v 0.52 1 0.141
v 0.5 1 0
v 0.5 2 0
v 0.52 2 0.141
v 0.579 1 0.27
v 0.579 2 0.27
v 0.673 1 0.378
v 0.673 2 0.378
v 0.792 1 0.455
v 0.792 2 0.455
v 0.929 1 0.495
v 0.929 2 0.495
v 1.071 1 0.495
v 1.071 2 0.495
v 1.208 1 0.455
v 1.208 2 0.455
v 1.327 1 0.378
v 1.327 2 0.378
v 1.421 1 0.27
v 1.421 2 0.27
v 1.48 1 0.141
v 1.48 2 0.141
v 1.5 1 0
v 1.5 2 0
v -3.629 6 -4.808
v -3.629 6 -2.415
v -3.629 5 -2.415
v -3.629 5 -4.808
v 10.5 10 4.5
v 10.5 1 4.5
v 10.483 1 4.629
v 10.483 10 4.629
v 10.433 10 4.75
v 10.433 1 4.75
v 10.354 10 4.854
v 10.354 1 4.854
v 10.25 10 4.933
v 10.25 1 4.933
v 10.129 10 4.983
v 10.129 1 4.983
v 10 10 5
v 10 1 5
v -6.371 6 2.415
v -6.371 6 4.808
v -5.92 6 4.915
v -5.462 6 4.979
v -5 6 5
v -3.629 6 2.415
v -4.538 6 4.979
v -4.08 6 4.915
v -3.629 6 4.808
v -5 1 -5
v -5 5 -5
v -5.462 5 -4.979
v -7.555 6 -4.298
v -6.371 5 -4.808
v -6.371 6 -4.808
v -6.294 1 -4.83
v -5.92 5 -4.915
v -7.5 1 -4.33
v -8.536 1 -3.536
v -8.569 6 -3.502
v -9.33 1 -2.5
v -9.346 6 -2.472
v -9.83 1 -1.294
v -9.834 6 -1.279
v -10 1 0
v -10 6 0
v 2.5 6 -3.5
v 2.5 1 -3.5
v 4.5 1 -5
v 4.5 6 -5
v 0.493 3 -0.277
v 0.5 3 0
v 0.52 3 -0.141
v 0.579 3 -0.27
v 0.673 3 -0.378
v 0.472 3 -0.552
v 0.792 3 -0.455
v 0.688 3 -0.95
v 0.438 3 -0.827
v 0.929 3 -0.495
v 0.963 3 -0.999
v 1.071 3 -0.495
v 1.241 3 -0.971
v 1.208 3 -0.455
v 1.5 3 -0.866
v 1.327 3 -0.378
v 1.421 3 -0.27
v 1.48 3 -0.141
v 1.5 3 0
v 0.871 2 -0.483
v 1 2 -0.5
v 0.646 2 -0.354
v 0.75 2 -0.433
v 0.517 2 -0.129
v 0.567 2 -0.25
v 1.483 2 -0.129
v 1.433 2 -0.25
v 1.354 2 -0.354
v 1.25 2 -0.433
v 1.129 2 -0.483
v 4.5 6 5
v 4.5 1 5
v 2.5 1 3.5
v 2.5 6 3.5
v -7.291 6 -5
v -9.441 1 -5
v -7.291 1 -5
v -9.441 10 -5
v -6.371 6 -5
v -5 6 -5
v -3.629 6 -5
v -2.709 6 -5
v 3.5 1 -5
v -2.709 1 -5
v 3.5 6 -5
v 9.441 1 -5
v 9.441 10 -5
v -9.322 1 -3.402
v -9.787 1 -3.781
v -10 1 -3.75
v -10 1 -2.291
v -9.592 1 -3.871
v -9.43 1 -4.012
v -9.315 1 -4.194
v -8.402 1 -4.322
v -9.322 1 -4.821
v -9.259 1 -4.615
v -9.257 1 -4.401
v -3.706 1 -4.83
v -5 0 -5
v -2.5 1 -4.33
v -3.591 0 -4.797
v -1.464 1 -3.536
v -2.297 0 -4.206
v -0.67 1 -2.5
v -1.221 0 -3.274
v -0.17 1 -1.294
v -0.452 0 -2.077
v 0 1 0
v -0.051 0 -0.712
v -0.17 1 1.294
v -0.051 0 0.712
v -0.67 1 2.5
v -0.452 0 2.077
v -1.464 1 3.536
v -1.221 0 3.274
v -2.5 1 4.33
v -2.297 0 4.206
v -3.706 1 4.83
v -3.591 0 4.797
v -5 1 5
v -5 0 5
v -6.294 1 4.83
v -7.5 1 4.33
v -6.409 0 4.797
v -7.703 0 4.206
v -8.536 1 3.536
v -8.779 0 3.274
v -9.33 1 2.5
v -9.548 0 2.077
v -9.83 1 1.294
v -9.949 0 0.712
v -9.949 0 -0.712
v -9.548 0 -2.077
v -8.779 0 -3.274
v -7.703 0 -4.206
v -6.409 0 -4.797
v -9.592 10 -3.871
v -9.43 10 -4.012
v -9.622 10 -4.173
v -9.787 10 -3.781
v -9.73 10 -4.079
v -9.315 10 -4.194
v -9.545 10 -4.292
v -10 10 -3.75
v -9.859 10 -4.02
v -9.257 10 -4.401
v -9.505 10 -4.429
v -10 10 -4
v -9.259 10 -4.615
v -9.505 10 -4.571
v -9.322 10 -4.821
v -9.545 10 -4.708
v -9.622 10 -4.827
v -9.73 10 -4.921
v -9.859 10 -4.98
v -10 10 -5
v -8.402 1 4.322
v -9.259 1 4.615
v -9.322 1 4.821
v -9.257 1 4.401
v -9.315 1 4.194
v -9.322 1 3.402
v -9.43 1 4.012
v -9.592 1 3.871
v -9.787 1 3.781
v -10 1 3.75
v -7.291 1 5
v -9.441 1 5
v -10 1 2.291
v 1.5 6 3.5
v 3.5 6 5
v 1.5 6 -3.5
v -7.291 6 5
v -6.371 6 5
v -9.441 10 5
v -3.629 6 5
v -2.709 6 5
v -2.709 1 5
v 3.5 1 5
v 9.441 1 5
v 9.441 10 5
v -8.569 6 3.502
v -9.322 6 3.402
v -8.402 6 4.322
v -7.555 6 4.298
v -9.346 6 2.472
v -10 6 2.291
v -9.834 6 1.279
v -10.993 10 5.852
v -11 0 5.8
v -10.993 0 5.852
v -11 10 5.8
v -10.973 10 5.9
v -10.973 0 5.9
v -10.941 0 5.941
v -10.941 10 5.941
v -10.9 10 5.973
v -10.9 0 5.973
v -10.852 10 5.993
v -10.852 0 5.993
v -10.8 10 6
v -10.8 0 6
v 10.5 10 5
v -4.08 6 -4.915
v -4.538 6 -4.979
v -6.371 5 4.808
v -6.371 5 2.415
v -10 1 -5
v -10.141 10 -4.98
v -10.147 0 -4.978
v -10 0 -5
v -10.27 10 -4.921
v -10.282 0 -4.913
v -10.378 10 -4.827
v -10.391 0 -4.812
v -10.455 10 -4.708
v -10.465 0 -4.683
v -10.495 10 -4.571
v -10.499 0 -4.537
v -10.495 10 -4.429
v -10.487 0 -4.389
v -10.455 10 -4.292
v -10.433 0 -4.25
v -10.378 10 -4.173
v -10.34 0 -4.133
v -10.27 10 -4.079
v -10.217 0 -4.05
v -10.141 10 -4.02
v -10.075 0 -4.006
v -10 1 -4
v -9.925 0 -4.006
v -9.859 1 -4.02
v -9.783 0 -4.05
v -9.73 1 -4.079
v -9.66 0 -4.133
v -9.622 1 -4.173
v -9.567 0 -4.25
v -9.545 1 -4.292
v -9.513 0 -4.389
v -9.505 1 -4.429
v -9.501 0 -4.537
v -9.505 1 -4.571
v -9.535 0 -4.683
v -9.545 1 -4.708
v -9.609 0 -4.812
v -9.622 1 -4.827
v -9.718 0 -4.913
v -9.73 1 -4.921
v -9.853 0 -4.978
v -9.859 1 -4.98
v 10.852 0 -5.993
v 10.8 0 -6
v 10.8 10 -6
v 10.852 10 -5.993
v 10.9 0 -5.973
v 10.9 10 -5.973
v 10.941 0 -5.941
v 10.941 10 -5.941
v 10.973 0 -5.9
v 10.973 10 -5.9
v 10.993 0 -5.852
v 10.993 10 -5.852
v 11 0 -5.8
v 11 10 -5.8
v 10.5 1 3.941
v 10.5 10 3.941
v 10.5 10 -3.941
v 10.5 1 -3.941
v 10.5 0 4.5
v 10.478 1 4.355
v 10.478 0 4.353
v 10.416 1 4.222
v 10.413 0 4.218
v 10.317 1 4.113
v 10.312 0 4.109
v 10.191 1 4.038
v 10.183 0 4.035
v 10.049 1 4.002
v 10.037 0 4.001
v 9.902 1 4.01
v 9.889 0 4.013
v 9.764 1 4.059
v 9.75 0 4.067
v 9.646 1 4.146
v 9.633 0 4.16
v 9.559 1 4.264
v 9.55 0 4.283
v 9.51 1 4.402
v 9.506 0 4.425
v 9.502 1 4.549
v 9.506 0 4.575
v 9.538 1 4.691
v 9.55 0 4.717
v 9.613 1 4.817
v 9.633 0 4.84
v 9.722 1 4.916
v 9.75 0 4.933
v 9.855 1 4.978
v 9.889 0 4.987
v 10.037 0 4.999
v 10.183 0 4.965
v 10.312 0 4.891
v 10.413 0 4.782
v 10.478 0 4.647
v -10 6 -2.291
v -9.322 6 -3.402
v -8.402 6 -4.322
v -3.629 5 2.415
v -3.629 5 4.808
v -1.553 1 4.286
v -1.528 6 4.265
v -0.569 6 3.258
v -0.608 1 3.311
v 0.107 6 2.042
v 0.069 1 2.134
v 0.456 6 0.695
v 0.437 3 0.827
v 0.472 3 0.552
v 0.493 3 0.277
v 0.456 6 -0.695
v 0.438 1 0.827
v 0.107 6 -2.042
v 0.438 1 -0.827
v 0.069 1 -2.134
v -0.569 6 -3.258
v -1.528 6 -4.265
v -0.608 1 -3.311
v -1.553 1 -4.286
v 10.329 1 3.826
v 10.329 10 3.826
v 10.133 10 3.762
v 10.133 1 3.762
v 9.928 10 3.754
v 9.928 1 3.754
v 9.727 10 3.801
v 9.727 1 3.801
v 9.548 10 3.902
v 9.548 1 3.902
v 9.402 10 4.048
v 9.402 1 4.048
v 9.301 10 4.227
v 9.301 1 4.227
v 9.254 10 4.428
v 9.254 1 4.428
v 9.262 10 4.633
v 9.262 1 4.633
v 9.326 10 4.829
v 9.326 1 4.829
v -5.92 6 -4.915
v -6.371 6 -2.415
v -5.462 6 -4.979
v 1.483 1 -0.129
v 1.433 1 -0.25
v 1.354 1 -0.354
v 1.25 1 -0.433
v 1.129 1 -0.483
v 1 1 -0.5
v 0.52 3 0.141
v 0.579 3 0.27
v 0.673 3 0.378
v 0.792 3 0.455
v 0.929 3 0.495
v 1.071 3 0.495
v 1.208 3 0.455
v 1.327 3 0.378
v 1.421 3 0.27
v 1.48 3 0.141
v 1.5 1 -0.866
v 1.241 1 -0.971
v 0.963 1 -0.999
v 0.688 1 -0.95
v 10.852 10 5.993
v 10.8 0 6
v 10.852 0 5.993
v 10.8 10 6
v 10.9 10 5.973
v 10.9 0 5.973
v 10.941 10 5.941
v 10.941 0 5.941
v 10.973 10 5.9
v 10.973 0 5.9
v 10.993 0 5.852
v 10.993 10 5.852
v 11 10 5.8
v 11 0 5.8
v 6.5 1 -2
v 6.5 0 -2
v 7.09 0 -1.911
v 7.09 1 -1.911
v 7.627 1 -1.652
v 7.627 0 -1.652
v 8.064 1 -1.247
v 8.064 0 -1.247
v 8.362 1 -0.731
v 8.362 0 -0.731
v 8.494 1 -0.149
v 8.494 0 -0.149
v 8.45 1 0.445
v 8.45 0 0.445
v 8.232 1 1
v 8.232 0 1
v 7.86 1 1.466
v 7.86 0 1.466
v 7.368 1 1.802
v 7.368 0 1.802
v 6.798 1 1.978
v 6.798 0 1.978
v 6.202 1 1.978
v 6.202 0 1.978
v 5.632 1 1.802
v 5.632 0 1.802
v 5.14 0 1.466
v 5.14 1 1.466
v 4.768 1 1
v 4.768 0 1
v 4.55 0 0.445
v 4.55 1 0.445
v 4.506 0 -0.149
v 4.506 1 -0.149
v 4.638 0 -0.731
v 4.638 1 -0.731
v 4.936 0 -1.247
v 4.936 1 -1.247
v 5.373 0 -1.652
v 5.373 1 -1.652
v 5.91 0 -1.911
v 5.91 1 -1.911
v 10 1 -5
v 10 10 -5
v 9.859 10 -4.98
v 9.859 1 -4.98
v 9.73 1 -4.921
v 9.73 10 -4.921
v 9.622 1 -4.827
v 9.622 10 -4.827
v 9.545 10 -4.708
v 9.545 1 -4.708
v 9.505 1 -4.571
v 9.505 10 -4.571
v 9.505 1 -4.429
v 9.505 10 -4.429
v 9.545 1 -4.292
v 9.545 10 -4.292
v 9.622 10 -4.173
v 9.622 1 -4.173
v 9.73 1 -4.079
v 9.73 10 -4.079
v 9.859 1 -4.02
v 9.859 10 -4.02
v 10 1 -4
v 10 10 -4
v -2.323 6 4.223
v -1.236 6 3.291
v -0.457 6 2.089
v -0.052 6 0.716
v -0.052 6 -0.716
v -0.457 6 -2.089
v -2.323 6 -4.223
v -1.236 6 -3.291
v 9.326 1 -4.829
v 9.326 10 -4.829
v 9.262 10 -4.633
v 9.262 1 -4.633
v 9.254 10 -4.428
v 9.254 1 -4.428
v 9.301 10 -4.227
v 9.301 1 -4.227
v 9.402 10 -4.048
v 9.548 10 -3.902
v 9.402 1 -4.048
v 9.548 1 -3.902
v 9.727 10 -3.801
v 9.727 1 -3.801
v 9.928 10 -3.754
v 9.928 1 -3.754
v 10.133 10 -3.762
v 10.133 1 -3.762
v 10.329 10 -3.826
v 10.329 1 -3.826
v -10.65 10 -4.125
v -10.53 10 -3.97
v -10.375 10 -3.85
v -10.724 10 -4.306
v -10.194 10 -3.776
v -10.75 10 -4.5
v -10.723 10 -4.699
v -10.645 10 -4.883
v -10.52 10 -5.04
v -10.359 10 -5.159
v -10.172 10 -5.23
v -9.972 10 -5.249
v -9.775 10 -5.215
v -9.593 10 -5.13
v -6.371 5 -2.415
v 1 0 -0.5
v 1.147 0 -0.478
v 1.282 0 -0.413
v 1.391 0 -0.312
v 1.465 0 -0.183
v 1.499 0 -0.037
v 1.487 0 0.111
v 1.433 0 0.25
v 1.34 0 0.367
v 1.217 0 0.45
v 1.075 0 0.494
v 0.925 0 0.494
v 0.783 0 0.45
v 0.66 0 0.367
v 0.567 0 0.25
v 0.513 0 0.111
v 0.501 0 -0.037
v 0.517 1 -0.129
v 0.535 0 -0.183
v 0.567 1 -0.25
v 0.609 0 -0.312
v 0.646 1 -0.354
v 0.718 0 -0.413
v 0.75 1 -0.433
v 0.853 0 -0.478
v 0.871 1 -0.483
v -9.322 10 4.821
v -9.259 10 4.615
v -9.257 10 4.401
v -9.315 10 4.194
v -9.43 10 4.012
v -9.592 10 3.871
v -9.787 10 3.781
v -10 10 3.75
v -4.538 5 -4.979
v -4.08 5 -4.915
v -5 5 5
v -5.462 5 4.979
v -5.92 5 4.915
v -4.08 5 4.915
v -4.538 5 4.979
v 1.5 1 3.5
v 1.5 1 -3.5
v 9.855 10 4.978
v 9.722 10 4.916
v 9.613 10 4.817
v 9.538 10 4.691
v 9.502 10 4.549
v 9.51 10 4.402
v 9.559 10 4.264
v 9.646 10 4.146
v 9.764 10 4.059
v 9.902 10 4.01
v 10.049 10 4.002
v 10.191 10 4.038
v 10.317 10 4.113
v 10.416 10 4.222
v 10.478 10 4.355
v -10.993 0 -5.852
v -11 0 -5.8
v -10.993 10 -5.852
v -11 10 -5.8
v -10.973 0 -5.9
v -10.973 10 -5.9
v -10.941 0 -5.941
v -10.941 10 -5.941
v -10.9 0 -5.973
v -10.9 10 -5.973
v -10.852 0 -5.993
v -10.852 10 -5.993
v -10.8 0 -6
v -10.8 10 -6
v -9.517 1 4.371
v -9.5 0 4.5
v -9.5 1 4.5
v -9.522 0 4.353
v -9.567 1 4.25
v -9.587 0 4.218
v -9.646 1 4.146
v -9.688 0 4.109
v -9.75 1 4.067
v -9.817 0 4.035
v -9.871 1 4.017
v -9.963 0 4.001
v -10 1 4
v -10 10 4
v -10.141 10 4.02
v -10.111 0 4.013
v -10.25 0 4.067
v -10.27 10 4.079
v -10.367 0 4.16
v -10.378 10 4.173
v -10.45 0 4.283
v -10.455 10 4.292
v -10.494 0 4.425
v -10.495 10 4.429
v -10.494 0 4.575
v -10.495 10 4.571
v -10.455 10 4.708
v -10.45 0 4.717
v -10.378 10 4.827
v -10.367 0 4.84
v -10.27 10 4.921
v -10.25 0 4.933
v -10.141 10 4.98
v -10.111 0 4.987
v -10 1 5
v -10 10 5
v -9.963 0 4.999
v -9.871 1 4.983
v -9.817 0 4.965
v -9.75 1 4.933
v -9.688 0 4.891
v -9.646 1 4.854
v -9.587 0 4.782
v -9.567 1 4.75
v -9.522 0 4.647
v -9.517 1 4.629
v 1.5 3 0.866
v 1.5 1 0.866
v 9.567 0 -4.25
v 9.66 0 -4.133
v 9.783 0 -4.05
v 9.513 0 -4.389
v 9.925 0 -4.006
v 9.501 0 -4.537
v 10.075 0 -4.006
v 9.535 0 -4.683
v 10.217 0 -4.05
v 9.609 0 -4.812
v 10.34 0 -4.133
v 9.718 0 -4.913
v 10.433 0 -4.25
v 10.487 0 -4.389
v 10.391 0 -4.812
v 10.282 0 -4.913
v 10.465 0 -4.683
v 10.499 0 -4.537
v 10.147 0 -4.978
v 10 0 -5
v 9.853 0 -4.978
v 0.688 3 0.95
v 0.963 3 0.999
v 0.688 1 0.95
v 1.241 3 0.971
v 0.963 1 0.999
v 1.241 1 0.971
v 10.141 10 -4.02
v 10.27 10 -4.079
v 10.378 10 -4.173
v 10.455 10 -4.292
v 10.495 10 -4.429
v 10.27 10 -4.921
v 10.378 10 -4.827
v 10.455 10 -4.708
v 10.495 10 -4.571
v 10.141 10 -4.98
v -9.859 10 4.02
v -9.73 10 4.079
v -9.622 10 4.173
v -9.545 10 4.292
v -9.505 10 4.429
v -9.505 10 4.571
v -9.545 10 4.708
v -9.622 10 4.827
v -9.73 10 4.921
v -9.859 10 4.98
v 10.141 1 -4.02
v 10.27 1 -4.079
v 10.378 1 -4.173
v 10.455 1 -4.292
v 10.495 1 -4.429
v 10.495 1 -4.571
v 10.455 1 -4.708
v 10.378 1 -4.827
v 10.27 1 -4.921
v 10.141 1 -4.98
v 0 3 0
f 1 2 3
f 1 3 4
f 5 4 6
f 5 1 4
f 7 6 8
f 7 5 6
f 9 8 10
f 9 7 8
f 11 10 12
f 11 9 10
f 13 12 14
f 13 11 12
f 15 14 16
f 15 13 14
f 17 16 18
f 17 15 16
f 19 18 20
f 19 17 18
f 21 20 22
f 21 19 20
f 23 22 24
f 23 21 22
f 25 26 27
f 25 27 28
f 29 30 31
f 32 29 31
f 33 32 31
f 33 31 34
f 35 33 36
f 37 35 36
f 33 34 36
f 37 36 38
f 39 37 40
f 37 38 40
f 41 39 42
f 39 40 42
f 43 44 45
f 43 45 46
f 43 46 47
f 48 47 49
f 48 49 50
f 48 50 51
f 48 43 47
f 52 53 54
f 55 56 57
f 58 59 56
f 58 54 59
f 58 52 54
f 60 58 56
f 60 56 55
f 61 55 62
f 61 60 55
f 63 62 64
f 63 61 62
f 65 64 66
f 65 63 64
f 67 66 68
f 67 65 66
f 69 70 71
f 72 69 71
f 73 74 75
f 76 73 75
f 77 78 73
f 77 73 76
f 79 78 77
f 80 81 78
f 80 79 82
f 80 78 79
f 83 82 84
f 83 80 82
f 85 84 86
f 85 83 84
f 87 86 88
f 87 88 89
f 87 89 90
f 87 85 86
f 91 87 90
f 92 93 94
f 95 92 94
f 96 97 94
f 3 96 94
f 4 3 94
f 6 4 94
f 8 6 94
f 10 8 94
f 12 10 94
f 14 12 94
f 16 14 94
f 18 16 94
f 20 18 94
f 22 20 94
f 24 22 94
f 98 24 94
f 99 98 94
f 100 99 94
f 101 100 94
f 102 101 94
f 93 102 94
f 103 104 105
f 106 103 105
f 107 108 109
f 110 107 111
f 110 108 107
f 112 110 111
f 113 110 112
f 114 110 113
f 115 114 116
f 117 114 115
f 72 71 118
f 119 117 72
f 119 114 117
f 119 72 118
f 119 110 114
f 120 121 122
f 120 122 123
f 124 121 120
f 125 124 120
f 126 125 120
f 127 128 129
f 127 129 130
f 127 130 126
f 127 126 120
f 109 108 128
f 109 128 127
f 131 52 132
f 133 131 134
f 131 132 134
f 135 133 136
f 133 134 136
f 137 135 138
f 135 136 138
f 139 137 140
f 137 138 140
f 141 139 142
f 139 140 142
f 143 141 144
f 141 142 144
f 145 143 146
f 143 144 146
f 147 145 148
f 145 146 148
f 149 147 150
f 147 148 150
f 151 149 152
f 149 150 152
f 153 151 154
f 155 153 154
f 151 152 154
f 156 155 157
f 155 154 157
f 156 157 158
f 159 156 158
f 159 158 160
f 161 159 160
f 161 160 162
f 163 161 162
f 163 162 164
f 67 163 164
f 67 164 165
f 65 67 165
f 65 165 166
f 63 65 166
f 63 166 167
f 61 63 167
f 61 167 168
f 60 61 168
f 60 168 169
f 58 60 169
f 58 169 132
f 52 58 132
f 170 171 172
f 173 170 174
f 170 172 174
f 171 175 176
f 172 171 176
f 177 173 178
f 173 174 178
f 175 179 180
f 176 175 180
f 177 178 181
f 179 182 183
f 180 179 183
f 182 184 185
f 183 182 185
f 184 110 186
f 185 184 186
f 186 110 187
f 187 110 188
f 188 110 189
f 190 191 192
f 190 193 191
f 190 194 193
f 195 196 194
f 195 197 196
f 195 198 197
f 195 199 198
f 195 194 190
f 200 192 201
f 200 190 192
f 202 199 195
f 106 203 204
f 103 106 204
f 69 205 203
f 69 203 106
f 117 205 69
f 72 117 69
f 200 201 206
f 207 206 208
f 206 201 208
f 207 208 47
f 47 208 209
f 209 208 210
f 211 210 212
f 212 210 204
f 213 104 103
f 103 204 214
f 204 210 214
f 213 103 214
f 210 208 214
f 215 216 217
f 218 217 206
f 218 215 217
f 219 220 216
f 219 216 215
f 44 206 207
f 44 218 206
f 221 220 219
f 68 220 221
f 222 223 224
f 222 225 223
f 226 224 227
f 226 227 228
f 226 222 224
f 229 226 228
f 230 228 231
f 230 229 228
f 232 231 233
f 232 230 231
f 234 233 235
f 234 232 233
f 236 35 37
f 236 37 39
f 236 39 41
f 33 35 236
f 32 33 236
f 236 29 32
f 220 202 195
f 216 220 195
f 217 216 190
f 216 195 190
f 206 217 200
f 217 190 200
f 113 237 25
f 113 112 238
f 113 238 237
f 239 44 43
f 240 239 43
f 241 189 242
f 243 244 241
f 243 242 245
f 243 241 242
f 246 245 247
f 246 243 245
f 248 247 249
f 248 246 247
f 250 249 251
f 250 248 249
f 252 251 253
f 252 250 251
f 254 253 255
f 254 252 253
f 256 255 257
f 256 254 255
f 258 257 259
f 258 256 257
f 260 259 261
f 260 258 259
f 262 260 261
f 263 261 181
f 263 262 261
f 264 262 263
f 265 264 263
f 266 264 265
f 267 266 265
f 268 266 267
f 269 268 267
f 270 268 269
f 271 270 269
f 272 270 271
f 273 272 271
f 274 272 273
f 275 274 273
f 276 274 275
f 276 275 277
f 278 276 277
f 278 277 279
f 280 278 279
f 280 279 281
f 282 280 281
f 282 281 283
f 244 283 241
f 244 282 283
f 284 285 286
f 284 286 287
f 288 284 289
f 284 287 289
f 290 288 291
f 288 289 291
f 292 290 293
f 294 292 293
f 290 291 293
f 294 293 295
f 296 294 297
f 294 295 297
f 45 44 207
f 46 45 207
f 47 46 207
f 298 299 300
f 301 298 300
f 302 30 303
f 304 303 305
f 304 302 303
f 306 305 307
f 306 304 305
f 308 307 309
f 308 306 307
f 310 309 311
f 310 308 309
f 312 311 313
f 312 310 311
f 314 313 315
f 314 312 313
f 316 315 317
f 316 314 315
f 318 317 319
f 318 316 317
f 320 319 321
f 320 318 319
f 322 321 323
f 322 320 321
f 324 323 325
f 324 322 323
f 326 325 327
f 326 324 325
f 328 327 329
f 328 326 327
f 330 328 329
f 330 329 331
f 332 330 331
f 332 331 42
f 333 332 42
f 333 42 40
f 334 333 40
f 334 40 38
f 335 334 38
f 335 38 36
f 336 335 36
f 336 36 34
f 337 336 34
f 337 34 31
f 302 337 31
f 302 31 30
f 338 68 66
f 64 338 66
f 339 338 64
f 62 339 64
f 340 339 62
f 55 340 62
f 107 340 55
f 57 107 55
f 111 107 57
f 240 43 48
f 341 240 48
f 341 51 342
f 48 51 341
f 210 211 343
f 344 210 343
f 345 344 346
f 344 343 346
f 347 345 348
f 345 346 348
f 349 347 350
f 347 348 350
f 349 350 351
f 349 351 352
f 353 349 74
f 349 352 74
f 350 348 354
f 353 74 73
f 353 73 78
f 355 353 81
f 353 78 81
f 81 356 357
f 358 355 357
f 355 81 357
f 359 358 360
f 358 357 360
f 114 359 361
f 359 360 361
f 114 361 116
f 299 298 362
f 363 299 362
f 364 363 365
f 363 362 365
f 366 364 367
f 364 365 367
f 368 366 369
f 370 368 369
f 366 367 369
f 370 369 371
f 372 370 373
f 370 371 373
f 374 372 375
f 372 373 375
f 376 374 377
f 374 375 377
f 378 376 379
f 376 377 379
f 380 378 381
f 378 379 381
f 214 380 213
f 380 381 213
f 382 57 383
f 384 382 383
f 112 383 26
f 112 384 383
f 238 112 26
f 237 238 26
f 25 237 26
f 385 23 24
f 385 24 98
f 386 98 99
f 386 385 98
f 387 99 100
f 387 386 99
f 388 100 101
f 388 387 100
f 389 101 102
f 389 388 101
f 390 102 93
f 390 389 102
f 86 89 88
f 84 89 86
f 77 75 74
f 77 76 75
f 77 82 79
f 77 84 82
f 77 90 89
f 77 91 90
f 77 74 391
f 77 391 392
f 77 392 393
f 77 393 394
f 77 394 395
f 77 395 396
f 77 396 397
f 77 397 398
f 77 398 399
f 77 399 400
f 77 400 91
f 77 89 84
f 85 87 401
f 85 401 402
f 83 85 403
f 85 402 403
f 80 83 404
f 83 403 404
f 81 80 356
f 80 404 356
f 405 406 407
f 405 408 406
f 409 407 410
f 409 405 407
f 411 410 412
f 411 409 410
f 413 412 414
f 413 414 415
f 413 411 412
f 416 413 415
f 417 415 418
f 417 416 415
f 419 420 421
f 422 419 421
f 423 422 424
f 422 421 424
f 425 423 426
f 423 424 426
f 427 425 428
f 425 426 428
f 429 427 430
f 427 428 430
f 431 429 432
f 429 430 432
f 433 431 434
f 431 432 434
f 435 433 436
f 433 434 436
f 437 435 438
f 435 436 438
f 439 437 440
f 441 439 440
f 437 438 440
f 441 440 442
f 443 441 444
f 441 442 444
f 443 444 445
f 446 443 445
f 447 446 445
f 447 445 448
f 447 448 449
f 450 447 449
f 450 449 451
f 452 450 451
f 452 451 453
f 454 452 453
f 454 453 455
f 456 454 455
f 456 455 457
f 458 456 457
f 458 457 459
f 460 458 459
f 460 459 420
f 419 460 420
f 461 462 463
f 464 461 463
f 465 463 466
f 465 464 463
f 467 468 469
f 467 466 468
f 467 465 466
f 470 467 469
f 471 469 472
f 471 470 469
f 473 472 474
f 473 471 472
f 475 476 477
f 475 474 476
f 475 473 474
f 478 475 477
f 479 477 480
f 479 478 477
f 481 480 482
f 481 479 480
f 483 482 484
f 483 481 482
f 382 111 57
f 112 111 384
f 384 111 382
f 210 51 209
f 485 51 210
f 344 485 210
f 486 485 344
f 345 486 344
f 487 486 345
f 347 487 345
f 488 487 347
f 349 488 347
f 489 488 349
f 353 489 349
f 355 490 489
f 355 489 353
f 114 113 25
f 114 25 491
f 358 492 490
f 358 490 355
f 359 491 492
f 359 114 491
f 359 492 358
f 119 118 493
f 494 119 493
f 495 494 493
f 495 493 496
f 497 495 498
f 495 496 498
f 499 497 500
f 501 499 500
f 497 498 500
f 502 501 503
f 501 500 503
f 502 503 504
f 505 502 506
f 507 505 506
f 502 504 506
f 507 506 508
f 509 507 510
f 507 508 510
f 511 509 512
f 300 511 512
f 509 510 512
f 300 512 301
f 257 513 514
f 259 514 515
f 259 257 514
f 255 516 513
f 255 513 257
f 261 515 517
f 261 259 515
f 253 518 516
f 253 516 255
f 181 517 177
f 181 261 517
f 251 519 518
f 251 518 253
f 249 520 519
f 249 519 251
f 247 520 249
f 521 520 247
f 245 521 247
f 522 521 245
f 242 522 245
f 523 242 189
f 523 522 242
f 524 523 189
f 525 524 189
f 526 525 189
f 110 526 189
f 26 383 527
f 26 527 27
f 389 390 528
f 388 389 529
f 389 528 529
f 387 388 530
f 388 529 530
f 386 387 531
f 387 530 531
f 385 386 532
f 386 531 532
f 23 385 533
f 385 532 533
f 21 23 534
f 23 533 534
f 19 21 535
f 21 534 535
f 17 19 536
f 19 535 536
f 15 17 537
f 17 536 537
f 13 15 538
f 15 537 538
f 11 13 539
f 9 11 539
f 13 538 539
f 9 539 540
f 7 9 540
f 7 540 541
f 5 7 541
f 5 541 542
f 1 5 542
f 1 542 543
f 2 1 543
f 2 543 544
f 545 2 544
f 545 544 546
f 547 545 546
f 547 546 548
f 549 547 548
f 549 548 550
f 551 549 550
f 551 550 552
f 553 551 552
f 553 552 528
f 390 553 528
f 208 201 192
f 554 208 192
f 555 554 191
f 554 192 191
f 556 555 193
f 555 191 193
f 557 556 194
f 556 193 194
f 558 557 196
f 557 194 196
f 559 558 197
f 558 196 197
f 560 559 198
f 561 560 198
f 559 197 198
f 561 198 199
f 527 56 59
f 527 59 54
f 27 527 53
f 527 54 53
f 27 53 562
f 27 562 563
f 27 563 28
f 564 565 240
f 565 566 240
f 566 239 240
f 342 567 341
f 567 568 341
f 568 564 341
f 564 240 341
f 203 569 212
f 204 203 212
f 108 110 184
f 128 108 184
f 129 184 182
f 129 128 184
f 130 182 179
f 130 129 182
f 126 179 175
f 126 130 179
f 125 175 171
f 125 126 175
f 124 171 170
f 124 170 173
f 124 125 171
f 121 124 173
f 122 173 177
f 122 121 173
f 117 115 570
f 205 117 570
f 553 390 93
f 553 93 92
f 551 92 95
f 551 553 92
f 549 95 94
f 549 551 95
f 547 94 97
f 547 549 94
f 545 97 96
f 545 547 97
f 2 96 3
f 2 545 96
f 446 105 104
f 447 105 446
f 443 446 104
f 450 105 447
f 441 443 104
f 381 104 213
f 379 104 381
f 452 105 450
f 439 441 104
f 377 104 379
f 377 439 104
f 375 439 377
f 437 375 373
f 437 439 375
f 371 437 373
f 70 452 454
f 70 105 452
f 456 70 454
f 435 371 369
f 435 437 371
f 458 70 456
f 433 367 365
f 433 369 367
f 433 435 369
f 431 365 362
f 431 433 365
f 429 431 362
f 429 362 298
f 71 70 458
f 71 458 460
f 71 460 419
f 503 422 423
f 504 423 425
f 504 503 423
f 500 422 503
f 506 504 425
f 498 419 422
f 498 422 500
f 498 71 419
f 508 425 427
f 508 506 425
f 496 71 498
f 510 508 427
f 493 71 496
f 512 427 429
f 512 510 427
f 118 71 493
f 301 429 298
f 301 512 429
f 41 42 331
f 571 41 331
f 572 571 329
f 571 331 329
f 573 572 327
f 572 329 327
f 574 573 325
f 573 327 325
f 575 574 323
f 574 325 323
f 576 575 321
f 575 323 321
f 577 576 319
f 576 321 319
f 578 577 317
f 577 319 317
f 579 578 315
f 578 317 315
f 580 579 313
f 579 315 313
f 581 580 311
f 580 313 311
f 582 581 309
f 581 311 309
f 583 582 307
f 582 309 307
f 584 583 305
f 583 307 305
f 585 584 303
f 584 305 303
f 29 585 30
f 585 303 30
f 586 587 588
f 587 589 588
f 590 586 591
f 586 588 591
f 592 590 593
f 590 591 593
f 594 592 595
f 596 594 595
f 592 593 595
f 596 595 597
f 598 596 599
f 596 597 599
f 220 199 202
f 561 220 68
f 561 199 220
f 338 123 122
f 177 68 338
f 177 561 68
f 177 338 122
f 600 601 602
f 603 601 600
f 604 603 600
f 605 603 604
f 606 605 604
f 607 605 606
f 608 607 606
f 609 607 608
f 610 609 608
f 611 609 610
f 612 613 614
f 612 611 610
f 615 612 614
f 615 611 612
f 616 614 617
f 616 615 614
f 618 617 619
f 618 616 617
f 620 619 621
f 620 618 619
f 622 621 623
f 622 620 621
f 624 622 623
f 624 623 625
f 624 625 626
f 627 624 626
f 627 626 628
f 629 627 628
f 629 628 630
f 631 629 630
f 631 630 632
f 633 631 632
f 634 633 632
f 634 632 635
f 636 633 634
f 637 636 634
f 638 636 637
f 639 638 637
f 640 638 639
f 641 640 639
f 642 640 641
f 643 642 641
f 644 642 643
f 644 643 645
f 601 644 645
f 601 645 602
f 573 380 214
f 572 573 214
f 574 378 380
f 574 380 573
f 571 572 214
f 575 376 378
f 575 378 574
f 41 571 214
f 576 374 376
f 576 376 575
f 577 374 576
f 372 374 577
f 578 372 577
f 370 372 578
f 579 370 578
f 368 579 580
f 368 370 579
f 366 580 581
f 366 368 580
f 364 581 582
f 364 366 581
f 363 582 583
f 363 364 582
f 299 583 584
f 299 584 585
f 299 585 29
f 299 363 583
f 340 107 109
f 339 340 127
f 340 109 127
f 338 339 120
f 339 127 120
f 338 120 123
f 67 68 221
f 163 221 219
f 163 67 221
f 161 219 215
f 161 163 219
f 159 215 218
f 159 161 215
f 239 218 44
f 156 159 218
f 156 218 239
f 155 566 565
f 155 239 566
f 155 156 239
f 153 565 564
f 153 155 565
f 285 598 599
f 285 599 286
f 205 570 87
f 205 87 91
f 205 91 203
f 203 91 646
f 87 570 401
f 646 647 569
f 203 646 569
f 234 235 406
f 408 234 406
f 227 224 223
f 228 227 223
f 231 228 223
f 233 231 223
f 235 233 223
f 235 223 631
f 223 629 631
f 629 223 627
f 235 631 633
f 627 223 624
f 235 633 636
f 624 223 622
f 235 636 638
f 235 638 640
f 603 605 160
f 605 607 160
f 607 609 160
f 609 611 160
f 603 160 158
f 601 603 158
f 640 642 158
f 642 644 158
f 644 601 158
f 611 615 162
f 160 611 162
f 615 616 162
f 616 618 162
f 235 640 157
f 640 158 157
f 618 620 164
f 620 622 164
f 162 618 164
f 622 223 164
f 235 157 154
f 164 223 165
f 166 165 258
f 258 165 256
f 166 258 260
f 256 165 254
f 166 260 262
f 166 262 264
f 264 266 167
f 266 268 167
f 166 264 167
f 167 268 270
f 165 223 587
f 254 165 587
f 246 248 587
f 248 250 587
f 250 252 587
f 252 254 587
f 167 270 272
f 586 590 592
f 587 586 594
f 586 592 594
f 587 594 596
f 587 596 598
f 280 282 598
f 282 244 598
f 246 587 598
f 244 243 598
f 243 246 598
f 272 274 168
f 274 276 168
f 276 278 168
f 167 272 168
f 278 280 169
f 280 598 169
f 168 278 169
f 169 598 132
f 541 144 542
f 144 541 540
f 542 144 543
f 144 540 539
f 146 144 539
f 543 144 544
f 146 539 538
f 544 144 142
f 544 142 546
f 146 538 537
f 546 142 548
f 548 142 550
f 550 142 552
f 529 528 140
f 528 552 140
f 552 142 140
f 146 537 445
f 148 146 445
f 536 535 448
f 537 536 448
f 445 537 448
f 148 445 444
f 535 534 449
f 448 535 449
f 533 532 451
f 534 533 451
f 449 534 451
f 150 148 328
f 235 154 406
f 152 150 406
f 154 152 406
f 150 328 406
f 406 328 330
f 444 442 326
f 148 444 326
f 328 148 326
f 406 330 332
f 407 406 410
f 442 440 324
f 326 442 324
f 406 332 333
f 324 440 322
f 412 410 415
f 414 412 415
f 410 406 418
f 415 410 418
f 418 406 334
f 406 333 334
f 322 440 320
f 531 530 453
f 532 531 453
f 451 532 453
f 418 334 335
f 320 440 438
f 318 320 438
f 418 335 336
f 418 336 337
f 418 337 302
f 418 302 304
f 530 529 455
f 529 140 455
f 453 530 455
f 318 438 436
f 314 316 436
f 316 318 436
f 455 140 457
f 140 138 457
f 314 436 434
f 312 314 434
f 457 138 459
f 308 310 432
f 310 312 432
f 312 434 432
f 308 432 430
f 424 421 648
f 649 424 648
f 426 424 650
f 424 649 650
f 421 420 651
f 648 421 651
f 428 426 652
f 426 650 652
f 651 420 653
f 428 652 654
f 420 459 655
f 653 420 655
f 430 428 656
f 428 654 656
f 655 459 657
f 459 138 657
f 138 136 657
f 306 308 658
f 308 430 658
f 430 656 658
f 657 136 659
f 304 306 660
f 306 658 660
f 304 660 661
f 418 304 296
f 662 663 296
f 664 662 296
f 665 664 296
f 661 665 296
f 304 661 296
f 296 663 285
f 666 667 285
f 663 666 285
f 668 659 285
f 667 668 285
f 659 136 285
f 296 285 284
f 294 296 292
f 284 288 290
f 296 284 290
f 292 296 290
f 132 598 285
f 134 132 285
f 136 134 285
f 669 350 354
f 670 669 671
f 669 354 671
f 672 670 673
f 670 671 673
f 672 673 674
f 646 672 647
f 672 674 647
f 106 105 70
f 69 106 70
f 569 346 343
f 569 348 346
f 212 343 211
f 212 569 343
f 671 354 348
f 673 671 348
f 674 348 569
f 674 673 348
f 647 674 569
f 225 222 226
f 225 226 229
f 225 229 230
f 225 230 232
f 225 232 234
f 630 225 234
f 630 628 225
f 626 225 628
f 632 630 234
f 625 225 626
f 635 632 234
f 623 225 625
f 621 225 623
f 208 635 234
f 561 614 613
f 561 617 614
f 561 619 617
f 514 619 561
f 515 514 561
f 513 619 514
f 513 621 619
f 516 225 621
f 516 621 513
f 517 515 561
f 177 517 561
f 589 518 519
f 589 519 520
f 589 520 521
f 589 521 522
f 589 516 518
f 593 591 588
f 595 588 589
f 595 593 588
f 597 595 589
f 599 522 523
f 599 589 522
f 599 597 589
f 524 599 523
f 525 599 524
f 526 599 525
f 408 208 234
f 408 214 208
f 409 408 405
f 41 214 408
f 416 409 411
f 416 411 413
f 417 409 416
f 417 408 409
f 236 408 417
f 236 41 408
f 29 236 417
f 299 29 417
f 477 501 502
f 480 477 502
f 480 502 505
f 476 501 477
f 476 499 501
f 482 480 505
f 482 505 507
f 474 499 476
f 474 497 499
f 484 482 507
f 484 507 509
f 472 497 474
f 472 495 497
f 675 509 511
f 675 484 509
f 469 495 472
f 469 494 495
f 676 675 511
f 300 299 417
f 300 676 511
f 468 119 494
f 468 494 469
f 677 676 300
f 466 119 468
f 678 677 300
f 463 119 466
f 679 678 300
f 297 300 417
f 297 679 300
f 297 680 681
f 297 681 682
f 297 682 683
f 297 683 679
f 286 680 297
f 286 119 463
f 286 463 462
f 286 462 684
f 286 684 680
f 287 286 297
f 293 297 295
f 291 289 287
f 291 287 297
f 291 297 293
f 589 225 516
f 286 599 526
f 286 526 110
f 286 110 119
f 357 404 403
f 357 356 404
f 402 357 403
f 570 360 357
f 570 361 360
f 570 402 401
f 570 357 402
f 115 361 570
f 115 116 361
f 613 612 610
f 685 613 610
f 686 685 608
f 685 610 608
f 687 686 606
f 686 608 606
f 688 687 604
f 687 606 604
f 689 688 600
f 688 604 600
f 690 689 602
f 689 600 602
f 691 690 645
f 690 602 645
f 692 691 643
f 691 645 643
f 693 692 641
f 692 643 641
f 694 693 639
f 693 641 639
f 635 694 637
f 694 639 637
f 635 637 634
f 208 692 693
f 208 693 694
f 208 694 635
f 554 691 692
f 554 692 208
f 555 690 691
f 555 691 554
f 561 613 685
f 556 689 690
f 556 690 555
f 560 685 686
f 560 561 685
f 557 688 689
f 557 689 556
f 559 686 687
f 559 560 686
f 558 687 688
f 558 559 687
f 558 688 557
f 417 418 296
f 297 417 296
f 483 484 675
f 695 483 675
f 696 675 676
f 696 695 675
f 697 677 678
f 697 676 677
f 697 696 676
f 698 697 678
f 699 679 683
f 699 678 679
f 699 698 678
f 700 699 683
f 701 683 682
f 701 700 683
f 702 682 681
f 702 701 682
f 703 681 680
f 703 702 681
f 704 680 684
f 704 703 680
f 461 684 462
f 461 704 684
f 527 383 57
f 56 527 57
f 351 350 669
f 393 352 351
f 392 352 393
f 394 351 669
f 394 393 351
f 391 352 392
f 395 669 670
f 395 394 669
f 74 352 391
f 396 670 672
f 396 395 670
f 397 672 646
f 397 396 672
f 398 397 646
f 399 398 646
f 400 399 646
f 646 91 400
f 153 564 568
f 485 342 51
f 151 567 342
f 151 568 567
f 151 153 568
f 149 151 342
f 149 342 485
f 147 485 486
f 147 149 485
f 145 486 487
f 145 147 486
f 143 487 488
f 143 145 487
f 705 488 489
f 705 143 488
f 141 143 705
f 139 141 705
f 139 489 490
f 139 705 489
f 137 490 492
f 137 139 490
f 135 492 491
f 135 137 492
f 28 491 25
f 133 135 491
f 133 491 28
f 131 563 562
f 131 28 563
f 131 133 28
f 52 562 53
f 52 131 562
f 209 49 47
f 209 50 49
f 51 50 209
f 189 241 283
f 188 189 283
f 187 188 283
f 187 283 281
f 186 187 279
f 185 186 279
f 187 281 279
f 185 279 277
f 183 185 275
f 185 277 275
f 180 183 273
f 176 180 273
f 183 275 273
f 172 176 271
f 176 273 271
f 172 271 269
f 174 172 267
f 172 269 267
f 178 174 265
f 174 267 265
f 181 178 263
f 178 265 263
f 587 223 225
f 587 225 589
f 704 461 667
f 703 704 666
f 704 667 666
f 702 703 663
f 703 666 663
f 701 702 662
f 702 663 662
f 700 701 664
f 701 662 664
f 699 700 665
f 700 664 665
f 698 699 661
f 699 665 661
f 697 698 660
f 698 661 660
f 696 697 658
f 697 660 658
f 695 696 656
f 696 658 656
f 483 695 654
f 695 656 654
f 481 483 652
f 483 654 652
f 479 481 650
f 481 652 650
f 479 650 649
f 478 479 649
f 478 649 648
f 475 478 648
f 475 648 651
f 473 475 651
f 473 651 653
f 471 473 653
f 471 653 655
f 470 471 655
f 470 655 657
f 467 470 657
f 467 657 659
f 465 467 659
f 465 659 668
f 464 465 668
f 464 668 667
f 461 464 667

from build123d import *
from build123d.topology import SkipClean

# Parameters (mm, degrees)
SKETCH1_W                 = 22
SKETCH1_H                 = 12
BOSS_EXTRUDE1_DEPTH       = 10
SKETCH2_W                 = 20.5
SKETCH2_H                 = 10
CUT_EXTRUDE1_DEPTH        = 9
FILLET1_R                 = 0.2
SKETCH3_R                 = 5
CUT_EXTRUDE2_DEPTH        = 17.031219542
SKETCH4_R                 = 0.5
CUT_EXTRUDE3_DEPTH        = 17.031219542
SKETCH5_R                 = 2
CUT_EXTRUDE4_DEPTH        = 17.031219542
BOSS_EXTRUDE2_DEPTH       = 5
SKETCH9_R                 = 5.5
SKETCH9_R_2               = 5
BOSS_EXTRUDE3_DEPTH       = 5
SKETCH10_R                = 1
SKETCH10_R_2              = 0.5
BOSS_EXTRUDE4_DEPTH       = 2
BOSS_EXTRUDE6_START       = -1
SKETCH12_R                = 0.5
BOSS_EXTRUDE6_DEPTH       = 1
SKETCH13_R                = 0.75
SKETCH13_R_2              = 0.5
BOSS_EXTRUDE7_DEPTH       = 9
SKETCH14_R                = 0.5
CUT_EXTRUDE5_DEPTH        = 17.031219542
MIRROR2_COPY_1_SKETCH_R   = 0.75
MIRROR2_COPY_1_SKETCH_R_2 = 0.5
MIRROR2_COPY_1_DEPTH      = 9
MIRROR2_COPY_2_SKETCH_R   = 0.5
MIRROR2_COPY_2_DEPTH      = 17.031219542
MIRROR2_COPY_3_SKETCH_R   = 0.75
MIRROR2_COPY_3_SKETCH_R_2 = 0.5
MIRROR2_COPY_3_DEPTH      = 9
MIRROR2_COPY_4_SKETCH_R   = 0.5
MIRROR2_COPY_4_DEPTH      = 17.031219542
SKETCH15_W                = 2.741193842
SKETCH15_H                = 3.121519946
BOSS_EXTRUDE8_DEPTH       = 1


with BuildPart() as part:
    # Sketch1 → Boss-Extrude1 (new body)
    with BuildSketch(Plane(origin=(0, 0, 0), x_dir=(1, 0, 0), z_dir=(0, 1, 0))):
        Rectangle(SKETCH1_W, SKETCH1_H)
    extrude(amount=BOSS_EXTRUDE1_DEPTH)

    # Sketch2 → Cut-Extrude1 (cut)
    with BuildSketch(Plane(origin=(0, 10, 0), x_dir=(1, 0, 0), z_dir=(0, 1, 0))):
        with Locations((0.25, 0)):
            Rectangle(SKETCH2_W, SKETCH2_H)
    extrude(amount=-CUT_EXTRUDE1_DEPTH, mode=Mode.SUBTRACT)

    # Fillet1
    fillet1_edges = [part.edges().sort_by_distance(p)[0] for p in [
        (-11, 5, -6),
        (11, 5, -6),
        (11, 5, 6),
        (-11, 5, 6),
    ]]
    fillet(fillet1_edges, radius=FILLET1_R)

    # Sketch3 → Cut-Extrude2 (cut, through all)
    with BuildSketch(Plane(origin=(0, 0, 0), x_dir=(-1, 0, 0), z_dir=(0, -1, 0))):
        with Locations((5, 0)):
            Circle(SKETCH3_R)
    extrude(amount=-CUT_EXTRUDE2_DEPTH, mode=Mode.SUBTRACT)

    # Sketch4 → Cut-Extrude3 (cut, through all)
    with BuildSketch(Plane(origin=(0, 0, 0), x_dir=(-1, 0, 0), z_dir=(0, -1, 0))):
        with Locations((-1, 0)):
            Circle(SKETCH4_R)
    extrude(amount=-CUT_EXTRUDE3_DEPTH, mode=Mode.SUBTRACT)

    # Sketch5 → Cut-Extrude4 (cut, through all)
    with BuildSketch(Plane(origin=(0, 0, 0), x_dir=(-1, 0, 0), z_dir=(0, -1, 0))):
        with Locations((-6.5, 0)):
            Circle(SKETCH5_R)
    extrude(amount=-CUT_EXTRUDE4_DEPTH, mode=Mode.SUBTRACT)

    # Sketch6 → Boss-Extrude2 (add)
    with BuildSketch(Plane(origin=(0, 1, 0), x_dir=(1, 0, 0), z_dir=(0, 1, 0))):
        Polygon((2.5, -3.5), (2.5, 3.5), (4.5, 5), (3.5, 5), (1.5, 3.5), (1.5, -3.5), (3.5, -5), (4.5, -5), align=None)
    extrude(amount=BOSS_EXTRUDE2_DEPTH)

    # Sketch9 → Boss-Extrude3 (add)
    with SkipClean():  # the faces are left unmerged after this step: merging them gives an invalid solid
        with BuildSketch(Plane(origin=(0, 1, 0), x_dir=(1, 0, 0), z_dir=(0, 1, 0))):
            with Locations((-5, 0)):
                Circle(SKETCH9_R)
            with Locations((-5, 0)):
                Circle(SKETCH9_R_2, mode=Mode.SUBTRACT)
        extrude(amount=BOSS_EXTRUDE3_DEPTH)

    # Sketch10 → Boss-Extrude4 (add)
    with SkipClean():  # the faces are left unmerged after this step: merging them gives an invalid solid
        with BuildSketch(Plane(origin=(0, 1, 0), x_dir=(1, 0, 0), z_dir=(0, 1, 0))):
            with Locations((1, 0)):
                Circle(SKETCH10_R)
            with Locations((1, 0)):
                Circle(SKETCH10_R_2, mode=Mode.SUBTRACT)
        extrude(amount=BOSS_EXTRUDE4_DEPTH)

    # Sketch12 → Boss-Extrude6 (add)
    with SkipClean():  # the faces are left unmerged after this step: merging them gives an invalid solid
        with BuildSketch(Plane(origin=(0, 3, 0), x_dir=(1, 0, 0), z_dir=(0, 1, 0)).offset(BOSS_EXTRUDE6_START)):
            with Locations((1, 0)):
                Circle(SKETCH12_R)
        extrude(amount=BOSS_EXTRUDE6_DEPTH)

    # Sketch13 → Boss-Extrude7 (add)
    with SkipClean():  # the faces are left unmerged after this step: merging them gives an invalid solid
        with BuildSketch(Plane(origin=(0, 1, 0), x_dir=(1, 0, 0), z_dir=(0, 1, 0))):
            with Locations((10, 4.5)):
                Circle(SKETCH13_R)
            with Locations((10, 4.5)):
                Circle(SKETCH13_R_2, mode=Mode.SUBTRACT)
        boss_extrude7 = extrude(amount=BOSS_EXTRUDE7_DEPTH)

    # Sketch14 → Cut-Extrude5 (cut, through all)
    with SkipClean():  # the faces are left unmerged after this step: merging them gives an invalid solid
        with BuildSketch(Plane(origin=(0, 0, 0), x_dir=(-1, 0, 0), z_dir=(0, -1, 0))):
            with Locations((-10, 4.5)):
                Circle(SKETCH14_R)
        cut_extrude5 = extrude(amount=-CUT_EXTRUDE5_DEPTH, mode=Mode.SUBTRACT)

    # Mirror1: Boss-Extrude7, Cut-Extrude5 across plane
    with SkipClean():  # the faces are left unmerged after this step: merging them gives an invalid solid
        add(boss_extrude7.mirror(Plane(origin=(0, 0, 0), x_dir=(0, 0, 1), z_dir=(1, 0, 0))))
        add(cut_extrude5.mirror(Plane(origin=(0, 0, 0), x_dir=(0, 0, 1), z_dir=(1, 0, 0))), mode=Mode.SUBTRACT)

    # Mirror2 copy 1 sketch → Mirror2 copy 1 (add)
    with SkipClean():  # the faces are left unmerged after this step: merging them gives an invalid solid
        with BuildSketch(Plane(origin=(0, 1, 0), x_dir=(-1, 0, 0), z_dir=(0, 1, 0))):
            with Locations((10, 4.5)):
                Circle(MIRROR2_COPY_1_SKETCH_R)
            with Locations((10, 4.5)):
                Circle(MIRROR2_COPY_1_SKETCH_R_2, mode=Mode.SUBTRACT)
        extrude(amount=MIRROR2_COPY_1_DEPTH)

    # Mirror2 copy 2 sketch → Mirror2 copy 2 (cut, through all)
    with SkipClean():  # the faces are left unmerged after this step: merging them gives an invalid solid
        with BuildSketch(Plane.XZ):
            with Locations((-10, 4.5)):
                Circle(MIRROR2_COPY_2_SKETCH_R)
        extrude(amount=-MIRROR2_COPY_2_DEPTH, mode=Mode.SUBTRACT)

    # Mirror2 copy 3 sketch → Mirror2 copy 3 (add)
    with SkipClean():  # the faces are left unmerged after this step: merging them gives an invalid solid
        with BuildSketch(Plane(origin=(0, 1, 0), x_dir=(1, 0, 0), z_dir=(0, 1, 0))):
            with Locations((10, -4.5)):
                Circle(MIRROR2_COPY_3_SKETCH_R)
            with Locations((10, -4.5)):
                Circle(MIRROR2_COPY_3_SKETCH_R_2, mode=Mode.SUBTRACT)
        extrude(amount=MIRROR2_COPY_3_DEPTH)

    # Mirror2 copy 4 sketch → Mirror2 copy 4 (cut, through all)
    with SkipClean():  # the faces are left unmerged after this step: merging them gives an invalid solid
        with BuildSketch(Plane(origin=(0, 0, 0), x_dir=(-1, 0, 0), z_dir=(0, -1, 0))):
            with Locations((-10, -4.5)):
                Circle(MIRROR2_COPY_4_SKETCH_R)
        extrude(amount=-MIRROR2_COPY_4_DEPTH, mode=Mode.SUBTRACT)

    # Sketch15 → Boss-Extrude8 (add)
    with SkipClean():  # the faces are left unmerged after this step: merging them gives an invalid solid
        with BuildSketch(Plane(origin=(0, 6, 0), x_dir=(1, 0, 0), z_dir=(0, 1, 0))):
            with Locations((-5, 3.975545746)):
                Rectangle(SKETCH15_W, SKETCH15_H)
            with Locations((-5, -3.975545746)):
                Rectangle(SKETCH15_W, SKETCH15_H)
        extrude(amount=-BOSS_EXTRUDE8_DEPTH)


solid = part.part
